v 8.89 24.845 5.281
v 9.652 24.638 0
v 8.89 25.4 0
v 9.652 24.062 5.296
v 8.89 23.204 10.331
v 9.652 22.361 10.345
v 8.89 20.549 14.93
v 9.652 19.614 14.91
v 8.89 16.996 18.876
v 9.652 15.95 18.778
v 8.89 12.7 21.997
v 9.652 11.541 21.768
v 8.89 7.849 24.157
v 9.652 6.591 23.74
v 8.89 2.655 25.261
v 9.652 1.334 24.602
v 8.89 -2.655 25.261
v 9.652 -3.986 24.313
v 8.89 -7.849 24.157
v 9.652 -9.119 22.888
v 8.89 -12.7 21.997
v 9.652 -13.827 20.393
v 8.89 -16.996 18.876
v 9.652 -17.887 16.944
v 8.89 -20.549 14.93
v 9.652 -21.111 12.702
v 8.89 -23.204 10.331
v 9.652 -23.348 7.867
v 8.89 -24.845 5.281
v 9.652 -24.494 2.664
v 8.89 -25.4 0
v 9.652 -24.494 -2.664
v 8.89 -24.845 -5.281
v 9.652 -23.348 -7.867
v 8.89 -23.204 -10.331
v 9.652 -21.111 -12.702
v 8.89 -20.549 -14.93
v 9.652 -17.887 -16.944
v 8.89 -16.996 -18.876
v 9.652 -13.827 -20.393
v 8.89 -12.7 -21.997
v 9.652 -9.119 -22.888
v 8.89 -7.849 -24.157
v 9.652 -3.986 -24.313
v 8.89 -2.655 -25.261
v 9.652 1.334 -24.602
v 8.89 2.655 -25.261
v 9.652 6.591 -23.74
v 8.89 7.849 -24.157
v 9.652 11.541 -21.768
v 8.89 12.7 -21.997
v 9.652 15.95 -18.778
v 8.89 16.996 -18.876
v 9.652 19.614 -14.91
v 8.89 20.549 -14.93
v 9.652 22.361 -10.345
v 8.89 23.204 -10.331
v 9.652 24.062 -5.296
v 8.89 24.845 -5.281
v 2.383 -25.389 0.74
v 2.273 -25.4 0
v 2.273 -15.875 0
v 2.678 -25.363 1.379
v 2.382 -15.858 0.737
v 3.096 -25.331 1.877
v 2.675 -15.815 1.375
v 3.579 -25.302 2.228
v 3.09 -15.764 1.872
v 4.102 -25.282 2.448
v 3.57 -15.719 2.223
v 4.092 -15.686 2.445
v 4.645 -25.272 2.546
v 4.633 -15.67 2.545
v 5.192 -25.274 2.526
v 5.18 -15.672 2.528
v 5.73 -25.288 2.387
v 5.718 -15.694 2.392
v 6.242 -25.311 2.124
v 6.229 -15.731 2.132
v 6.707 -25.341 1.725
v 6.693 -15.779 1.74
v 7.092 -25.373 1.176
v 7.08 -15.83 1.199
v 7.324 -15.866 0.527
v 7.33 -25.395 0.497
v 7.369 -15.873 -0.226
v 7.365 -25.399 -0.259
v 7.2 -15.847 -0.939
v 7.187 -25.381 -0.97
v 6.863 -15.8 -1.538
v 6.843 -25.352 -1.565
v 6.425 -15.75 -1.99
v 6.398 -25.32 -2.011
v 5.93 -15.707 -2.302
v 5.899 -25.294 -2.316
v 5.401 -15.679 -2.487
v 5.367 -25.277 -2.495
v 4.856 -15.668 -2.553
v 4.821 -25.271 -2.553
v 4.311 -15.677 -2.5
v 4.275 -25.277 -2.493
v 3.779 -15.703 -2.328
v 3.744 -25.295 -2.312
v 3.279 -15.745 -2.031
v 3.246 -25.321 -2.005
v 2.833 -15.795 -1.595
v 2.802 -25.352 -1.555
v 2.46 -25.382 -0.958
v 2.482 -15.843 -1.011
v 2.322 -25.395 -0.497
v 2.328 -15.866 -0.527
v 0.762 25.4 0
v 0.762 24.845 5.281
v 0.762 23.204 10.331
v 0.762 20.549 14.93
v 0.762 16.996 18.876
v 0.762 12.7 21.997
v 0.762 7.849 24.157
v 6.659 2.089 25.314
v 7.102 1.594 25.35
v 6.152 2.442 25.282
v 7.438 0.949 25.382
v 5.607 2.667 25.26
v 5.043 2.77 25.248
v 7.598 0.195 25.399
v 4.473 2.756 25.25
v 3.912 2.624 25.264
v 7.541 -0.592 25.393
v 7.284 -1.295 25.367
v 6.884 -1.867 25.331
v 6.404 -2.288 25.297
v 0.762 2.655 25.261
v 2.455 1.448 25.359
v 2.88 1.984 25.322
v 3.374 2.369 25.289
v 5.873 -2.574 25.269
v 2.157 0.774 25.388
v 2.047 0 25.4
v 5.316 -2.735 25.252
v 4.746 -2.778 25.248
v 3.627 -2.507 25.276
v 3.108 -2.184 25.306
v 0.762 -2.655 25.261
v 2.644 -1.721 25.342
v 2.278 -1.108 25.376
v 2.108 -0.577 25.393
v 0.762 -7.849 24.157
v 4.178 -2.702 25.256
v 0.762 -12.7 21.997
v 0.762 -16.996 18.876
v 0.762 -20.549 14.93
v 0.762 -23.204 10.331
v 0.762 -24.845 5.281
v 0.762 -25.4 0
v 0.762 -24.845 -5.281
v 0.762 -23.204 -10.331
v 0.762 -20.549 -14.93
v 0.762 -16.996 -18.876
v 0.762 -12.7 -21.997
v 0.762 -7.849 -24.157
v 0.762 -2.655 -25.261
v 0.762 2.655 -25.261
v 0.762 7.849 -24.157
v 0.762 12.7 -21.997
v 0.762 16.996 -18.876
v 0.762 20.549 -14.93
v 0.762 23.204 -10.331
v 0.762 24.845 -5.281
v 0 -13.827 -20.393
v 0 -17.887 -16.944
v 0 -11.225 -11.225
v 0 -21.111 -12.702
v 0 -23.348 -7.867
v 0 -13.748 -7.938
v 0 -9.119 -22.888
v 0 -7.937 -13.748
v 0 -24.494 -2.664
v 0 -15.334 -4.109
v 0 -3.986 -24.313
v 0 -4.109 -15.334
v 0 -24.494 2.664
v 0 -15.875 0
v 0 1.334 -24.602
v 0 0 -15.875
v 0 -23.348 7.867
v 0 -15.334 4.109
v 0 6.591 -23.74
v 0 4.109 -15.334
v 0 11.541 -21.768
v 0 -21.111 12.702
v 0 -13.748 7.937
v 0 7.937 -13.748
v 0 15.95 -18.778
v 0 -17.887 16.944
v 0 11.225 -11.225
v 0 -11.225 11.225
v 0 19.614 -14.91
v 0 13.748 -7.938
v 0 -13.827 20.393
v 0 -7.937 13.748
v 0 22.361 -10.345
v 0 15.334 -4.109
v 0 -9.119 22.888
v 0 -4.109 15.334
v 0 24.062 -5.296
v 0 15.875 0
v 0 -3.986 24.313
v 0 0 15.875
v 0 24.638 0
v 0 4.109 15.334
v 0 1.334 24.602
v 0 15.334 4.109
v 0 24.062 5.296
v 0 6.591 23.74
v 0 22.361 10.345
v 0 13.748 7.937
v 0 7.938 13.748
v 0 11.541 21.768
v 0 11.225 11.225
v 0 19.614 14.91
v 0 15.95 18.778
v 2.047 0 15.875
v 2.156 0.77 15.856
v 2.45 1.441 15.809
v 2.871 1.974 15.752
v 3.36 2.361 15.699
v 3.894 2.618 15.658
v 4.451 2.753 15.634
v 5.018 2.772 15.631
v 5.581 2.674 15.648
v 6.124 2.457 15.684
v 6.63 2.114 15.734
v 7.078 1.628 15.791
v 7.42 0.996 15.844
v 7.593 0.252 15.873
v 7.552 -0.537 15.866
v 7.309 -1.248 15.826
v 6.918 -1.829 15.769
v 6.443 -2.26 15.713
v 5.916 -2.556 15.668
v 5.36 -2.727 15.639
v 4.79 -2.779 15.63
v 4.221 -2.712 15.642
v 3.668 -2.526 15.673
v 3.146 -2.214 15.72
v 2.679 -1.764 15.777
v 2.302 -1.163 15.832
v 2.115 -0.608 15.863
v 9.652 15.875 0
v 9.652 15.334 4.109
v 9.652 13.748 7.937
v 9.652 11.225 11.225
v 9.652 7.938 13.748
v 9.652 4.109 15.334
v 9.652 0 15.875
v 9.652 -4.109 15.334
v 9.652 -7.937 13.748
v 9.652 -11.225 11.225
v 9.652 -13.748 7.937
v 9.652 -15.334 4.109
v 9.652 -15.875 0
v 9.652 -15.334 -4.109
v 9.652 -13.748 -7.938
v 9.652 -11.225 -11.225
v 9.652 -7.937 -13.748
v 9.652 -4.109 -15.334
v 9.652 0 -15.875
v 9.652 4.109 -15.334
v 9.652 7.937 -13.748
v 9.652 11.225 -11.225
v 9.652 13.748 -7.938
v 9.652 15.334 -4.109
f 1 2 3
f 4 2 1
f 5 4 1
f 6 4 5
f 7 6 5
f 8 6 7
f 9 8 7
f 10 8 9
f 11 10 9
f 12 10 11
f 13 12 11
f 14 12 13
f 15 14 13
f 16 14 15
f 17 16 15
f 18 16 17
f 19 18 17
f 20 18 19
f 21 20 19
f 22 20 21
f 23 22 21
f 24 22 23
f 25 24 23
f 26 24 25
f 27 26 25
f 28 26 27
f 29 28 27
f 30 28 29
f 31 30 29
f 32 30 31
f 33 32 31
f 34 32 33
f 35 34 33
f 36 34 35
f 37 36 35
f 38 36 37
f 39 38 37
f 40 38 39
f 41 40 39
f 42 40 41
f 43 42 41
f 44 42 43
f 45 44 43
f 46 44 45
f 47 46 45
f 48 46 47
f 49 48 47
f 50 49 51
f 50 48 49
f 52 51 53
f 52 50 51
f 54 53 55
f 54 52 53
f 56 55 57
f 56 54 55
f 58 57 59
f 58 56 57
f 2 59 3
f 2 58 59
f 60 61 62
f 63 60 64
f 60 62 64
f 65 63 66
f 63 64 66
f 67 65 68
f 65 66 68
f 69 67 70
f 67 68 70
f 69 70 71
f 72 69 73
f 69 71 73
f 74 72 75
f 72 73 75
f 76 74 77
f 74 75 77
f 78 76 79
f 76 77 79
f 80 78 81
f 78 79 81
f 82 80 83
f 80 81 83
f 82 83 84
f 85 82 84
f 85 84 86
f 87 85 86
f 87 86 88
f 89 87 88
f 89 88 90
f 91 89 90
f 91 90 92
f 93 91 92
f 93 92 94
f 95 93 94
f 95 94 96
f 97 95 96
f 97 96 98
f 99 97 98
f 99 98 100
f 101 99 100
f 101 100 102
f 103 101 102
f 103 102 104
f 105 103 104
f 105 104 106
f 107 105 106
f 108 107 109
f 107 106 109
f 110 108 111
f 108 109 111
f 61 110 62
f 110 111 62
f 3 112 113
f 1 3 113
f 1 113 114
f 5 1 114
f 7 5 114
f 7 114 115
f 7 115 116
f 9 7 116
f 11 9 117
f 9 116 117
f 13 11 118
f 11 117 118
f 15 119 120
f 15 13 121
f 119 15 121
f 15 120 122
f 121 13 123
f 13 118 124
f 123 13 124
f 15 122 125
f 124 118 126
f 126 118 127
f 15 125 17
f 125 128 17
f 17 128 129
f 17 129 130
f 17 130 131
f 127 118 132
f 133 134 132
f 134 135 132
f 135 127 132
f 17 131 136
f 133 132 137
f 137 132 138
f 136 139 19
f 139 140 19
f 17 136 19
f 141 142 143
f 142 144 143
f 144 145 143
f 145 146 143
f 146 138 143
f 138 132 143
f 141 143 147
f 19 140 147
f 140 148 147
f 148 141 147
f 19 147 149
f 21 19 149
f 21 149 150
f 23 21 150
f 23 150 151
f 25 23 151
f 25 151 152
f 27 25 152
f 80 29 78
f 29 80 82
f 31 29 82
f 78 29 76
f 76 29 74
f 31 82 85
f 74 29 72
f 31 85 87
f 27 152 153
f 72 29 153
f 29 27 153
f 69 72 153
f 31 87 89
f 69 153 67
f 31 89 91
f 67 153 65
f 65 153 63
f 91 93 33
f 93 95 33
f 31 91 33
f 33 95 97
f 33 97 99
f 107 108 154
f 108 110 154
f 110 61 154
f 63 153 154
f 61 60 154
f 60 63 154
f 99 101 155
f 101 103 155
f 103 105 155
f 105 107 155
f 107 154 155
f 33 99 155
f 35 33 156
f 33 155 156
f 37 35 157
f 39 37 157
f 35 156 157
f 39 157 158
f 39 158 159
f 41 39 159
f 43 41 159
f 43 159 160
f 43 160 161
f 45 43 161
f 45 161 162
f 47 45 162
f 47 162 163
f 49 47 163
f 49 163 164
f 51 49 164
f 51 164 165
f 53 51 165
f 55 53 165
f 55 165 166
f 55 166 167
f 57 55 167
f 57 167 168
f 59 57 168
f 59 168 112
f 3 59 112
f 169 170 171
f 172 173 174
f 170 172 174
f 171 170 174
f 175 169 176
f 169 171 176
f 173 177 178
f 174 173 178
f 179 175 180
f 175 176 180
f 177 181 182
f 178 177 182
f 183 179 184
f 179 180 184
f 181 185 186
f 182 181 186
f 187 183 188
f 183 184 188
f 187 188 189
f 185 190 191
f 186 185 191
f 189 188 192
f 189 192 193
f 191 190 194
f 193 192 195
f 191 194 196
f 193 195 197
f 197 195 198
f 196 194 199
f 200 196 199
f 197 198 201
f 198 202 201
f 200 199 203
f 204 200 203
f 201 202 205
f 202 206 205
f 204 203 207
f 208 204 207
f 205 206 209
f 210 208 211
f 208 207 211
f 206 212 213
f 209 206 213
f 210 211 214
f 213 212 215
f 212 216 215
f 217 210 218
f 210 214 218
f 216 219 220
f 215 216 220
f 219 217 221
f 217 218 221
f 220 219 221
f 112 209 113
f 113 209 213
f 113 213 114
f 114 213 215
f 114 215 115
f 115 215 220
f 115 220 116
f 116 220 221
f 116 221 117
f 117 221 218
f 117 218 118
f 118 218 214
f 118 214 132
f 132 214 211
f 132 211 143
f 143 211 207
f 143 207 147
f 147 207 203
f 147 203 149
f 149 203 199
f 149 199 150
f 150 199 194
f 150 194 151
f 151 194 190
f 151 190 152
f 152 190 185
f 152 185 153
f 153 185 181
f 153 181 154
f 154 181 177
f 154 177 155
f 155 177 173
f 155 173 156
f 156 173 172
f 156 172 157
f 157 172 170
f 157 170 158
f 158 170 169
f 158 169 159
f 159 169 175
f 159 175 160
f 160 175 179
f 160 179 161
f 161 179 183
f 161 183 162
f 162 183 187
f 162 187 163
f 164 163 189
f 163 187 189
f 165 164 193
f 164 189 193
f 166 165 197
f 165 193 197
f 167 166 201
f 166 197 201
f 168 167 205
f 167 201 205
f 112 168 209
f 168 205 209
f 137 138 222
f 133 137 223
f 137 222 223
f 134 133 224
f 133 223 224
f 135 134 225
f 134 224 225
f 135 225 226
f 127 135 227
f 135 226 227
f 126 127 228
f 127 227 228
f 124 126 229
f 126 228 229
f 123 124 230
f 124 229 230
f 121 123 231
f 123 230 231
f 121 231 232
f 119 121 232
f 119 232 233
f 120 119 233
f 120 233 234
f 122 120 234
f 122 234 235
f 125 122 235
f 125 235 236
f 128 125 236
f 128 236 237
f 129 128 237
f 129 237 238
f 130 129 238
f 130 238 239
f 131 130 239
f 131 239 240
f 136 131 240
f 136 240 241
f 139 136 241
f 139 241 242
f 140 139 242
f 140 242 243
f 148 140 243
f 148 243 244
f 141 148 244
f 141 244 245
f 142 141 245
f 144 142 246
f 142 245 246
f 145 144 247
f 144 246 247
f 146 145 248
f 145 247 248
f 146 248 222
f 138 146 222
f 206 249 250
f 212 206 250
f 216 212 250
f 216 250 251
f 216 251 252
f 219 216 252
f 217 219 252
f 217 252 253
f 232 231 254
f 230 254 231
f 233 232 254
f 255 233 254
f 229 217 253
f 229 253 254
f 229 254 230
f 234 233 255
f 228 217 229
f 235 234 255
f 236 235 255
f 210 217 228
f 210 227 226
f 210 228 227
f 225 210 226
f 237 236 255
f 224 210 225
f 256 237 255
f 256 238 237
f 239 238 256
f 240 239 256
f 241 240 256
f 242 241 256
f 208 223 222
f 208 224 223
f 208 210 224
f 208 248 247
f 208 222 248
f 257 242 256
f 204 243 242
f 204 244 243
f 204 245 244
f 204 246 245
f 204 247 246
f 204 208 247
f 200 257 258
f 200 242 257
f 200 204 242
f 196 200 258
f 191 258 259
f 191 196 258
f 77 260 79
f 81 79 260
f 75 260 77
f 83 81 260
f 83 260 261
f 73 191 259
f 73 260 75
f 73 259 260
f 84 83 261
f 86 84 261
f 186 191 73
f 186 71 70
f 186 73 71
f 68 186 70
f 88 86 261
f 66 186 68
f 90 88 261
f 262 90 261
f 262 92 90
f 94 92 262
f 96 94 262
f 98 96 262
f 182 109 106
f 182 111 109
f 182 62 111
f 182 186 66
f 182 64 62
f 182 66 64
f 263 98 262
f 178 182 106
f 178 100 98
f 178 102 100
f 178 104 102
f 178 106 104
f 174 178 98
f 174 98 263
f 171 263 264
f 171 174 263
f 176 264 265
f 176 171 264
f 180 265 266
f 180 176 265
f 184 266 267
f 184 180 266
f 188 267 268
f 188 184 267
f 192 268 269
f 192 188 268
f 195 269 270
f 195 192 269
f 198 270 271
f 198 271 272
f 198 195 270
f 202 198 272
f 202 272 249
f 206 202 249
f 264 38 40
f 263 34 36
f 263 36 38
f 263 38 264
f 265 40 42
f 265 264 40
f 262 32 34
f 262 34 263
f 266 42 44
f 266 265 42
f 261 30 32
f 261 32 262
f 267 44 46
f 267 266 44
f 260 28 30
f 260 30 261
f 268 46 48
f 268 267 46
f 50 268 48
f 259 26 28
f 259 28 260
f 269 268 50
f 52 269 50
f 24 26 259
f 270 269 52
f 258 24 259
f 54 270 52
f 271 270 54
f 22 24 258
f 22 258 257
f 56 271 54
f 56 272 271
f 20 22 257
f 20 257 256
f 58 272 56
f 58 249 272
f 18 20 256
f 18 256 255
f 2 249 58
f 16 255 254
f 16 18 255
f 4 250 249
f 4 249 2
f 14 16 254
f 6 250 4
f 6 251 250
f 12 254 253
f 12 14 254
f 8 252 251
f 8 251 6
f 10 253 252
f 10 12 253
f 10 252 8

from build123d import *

# Parameters (mm, degrees)
F0_R     = 25.4
F0_R_2   = 15.875
F1_DEPTH = 9.652
F2_SIZE  = 0.762
F7_SIZE  = 0.762
F8_D     = 5.55752
F8_DEPTH = 16.51
F8_TIP   = 1.6696474537
F9_D     = 5.1054
F9_DEPTH = 16.51
F9_TIP   = 1.5338169022


with BuildPart() as f1:
    # F0 (on Right) → F1 (new body)
    with BuildSketch(Plane.YZ):
        Circle(F0_R)
        Circle(F0_R_2, mode=Mode.SUBTRACT)
    extrude(amount=F1_DEPTH)

    # F2
    f2_edges = [f1.edges().sort_by_distance(p)[0] for p in [
        (9.652, -25.4, 0),
    ]]
    chamfer(f2_edges, length=F2_SIZE)

    # F7
    f7_edges = [f1.edges().sort_by_distance(p)[0] for p in [
        (0, -25.4, 0),
    ]]
    chamfer(f7_edges, length=F7_SIZE)

    # F8
    with Locations(Plane.XY.offset(25.4)):
        with Locations((4.826, 0)):
            Hole(F8_D / 2, depth=F8_DEPTH)
            with Locations((0, 0, -(F8_DEPTH + F8_TIP / 2))):  # 118° drill point
                Cone(0, F8_D / 2, F8_TIP, mode=Mode.SUBTRACT)

    # F9
    with Locations(Plane.XZ.offset(25.4)):
        with Locations((4.826, 0)):
            Hole(F9_D / 2, depth=F9_DEPTH)
            with Locations((0, 0, -(F9_DEPTH + F9_TIP / 2))):  # 118° drill point
                Cone(0, F9_D / 2, F9_TIP, mode=Mode.SUBTRACT)


solid = f1.part
